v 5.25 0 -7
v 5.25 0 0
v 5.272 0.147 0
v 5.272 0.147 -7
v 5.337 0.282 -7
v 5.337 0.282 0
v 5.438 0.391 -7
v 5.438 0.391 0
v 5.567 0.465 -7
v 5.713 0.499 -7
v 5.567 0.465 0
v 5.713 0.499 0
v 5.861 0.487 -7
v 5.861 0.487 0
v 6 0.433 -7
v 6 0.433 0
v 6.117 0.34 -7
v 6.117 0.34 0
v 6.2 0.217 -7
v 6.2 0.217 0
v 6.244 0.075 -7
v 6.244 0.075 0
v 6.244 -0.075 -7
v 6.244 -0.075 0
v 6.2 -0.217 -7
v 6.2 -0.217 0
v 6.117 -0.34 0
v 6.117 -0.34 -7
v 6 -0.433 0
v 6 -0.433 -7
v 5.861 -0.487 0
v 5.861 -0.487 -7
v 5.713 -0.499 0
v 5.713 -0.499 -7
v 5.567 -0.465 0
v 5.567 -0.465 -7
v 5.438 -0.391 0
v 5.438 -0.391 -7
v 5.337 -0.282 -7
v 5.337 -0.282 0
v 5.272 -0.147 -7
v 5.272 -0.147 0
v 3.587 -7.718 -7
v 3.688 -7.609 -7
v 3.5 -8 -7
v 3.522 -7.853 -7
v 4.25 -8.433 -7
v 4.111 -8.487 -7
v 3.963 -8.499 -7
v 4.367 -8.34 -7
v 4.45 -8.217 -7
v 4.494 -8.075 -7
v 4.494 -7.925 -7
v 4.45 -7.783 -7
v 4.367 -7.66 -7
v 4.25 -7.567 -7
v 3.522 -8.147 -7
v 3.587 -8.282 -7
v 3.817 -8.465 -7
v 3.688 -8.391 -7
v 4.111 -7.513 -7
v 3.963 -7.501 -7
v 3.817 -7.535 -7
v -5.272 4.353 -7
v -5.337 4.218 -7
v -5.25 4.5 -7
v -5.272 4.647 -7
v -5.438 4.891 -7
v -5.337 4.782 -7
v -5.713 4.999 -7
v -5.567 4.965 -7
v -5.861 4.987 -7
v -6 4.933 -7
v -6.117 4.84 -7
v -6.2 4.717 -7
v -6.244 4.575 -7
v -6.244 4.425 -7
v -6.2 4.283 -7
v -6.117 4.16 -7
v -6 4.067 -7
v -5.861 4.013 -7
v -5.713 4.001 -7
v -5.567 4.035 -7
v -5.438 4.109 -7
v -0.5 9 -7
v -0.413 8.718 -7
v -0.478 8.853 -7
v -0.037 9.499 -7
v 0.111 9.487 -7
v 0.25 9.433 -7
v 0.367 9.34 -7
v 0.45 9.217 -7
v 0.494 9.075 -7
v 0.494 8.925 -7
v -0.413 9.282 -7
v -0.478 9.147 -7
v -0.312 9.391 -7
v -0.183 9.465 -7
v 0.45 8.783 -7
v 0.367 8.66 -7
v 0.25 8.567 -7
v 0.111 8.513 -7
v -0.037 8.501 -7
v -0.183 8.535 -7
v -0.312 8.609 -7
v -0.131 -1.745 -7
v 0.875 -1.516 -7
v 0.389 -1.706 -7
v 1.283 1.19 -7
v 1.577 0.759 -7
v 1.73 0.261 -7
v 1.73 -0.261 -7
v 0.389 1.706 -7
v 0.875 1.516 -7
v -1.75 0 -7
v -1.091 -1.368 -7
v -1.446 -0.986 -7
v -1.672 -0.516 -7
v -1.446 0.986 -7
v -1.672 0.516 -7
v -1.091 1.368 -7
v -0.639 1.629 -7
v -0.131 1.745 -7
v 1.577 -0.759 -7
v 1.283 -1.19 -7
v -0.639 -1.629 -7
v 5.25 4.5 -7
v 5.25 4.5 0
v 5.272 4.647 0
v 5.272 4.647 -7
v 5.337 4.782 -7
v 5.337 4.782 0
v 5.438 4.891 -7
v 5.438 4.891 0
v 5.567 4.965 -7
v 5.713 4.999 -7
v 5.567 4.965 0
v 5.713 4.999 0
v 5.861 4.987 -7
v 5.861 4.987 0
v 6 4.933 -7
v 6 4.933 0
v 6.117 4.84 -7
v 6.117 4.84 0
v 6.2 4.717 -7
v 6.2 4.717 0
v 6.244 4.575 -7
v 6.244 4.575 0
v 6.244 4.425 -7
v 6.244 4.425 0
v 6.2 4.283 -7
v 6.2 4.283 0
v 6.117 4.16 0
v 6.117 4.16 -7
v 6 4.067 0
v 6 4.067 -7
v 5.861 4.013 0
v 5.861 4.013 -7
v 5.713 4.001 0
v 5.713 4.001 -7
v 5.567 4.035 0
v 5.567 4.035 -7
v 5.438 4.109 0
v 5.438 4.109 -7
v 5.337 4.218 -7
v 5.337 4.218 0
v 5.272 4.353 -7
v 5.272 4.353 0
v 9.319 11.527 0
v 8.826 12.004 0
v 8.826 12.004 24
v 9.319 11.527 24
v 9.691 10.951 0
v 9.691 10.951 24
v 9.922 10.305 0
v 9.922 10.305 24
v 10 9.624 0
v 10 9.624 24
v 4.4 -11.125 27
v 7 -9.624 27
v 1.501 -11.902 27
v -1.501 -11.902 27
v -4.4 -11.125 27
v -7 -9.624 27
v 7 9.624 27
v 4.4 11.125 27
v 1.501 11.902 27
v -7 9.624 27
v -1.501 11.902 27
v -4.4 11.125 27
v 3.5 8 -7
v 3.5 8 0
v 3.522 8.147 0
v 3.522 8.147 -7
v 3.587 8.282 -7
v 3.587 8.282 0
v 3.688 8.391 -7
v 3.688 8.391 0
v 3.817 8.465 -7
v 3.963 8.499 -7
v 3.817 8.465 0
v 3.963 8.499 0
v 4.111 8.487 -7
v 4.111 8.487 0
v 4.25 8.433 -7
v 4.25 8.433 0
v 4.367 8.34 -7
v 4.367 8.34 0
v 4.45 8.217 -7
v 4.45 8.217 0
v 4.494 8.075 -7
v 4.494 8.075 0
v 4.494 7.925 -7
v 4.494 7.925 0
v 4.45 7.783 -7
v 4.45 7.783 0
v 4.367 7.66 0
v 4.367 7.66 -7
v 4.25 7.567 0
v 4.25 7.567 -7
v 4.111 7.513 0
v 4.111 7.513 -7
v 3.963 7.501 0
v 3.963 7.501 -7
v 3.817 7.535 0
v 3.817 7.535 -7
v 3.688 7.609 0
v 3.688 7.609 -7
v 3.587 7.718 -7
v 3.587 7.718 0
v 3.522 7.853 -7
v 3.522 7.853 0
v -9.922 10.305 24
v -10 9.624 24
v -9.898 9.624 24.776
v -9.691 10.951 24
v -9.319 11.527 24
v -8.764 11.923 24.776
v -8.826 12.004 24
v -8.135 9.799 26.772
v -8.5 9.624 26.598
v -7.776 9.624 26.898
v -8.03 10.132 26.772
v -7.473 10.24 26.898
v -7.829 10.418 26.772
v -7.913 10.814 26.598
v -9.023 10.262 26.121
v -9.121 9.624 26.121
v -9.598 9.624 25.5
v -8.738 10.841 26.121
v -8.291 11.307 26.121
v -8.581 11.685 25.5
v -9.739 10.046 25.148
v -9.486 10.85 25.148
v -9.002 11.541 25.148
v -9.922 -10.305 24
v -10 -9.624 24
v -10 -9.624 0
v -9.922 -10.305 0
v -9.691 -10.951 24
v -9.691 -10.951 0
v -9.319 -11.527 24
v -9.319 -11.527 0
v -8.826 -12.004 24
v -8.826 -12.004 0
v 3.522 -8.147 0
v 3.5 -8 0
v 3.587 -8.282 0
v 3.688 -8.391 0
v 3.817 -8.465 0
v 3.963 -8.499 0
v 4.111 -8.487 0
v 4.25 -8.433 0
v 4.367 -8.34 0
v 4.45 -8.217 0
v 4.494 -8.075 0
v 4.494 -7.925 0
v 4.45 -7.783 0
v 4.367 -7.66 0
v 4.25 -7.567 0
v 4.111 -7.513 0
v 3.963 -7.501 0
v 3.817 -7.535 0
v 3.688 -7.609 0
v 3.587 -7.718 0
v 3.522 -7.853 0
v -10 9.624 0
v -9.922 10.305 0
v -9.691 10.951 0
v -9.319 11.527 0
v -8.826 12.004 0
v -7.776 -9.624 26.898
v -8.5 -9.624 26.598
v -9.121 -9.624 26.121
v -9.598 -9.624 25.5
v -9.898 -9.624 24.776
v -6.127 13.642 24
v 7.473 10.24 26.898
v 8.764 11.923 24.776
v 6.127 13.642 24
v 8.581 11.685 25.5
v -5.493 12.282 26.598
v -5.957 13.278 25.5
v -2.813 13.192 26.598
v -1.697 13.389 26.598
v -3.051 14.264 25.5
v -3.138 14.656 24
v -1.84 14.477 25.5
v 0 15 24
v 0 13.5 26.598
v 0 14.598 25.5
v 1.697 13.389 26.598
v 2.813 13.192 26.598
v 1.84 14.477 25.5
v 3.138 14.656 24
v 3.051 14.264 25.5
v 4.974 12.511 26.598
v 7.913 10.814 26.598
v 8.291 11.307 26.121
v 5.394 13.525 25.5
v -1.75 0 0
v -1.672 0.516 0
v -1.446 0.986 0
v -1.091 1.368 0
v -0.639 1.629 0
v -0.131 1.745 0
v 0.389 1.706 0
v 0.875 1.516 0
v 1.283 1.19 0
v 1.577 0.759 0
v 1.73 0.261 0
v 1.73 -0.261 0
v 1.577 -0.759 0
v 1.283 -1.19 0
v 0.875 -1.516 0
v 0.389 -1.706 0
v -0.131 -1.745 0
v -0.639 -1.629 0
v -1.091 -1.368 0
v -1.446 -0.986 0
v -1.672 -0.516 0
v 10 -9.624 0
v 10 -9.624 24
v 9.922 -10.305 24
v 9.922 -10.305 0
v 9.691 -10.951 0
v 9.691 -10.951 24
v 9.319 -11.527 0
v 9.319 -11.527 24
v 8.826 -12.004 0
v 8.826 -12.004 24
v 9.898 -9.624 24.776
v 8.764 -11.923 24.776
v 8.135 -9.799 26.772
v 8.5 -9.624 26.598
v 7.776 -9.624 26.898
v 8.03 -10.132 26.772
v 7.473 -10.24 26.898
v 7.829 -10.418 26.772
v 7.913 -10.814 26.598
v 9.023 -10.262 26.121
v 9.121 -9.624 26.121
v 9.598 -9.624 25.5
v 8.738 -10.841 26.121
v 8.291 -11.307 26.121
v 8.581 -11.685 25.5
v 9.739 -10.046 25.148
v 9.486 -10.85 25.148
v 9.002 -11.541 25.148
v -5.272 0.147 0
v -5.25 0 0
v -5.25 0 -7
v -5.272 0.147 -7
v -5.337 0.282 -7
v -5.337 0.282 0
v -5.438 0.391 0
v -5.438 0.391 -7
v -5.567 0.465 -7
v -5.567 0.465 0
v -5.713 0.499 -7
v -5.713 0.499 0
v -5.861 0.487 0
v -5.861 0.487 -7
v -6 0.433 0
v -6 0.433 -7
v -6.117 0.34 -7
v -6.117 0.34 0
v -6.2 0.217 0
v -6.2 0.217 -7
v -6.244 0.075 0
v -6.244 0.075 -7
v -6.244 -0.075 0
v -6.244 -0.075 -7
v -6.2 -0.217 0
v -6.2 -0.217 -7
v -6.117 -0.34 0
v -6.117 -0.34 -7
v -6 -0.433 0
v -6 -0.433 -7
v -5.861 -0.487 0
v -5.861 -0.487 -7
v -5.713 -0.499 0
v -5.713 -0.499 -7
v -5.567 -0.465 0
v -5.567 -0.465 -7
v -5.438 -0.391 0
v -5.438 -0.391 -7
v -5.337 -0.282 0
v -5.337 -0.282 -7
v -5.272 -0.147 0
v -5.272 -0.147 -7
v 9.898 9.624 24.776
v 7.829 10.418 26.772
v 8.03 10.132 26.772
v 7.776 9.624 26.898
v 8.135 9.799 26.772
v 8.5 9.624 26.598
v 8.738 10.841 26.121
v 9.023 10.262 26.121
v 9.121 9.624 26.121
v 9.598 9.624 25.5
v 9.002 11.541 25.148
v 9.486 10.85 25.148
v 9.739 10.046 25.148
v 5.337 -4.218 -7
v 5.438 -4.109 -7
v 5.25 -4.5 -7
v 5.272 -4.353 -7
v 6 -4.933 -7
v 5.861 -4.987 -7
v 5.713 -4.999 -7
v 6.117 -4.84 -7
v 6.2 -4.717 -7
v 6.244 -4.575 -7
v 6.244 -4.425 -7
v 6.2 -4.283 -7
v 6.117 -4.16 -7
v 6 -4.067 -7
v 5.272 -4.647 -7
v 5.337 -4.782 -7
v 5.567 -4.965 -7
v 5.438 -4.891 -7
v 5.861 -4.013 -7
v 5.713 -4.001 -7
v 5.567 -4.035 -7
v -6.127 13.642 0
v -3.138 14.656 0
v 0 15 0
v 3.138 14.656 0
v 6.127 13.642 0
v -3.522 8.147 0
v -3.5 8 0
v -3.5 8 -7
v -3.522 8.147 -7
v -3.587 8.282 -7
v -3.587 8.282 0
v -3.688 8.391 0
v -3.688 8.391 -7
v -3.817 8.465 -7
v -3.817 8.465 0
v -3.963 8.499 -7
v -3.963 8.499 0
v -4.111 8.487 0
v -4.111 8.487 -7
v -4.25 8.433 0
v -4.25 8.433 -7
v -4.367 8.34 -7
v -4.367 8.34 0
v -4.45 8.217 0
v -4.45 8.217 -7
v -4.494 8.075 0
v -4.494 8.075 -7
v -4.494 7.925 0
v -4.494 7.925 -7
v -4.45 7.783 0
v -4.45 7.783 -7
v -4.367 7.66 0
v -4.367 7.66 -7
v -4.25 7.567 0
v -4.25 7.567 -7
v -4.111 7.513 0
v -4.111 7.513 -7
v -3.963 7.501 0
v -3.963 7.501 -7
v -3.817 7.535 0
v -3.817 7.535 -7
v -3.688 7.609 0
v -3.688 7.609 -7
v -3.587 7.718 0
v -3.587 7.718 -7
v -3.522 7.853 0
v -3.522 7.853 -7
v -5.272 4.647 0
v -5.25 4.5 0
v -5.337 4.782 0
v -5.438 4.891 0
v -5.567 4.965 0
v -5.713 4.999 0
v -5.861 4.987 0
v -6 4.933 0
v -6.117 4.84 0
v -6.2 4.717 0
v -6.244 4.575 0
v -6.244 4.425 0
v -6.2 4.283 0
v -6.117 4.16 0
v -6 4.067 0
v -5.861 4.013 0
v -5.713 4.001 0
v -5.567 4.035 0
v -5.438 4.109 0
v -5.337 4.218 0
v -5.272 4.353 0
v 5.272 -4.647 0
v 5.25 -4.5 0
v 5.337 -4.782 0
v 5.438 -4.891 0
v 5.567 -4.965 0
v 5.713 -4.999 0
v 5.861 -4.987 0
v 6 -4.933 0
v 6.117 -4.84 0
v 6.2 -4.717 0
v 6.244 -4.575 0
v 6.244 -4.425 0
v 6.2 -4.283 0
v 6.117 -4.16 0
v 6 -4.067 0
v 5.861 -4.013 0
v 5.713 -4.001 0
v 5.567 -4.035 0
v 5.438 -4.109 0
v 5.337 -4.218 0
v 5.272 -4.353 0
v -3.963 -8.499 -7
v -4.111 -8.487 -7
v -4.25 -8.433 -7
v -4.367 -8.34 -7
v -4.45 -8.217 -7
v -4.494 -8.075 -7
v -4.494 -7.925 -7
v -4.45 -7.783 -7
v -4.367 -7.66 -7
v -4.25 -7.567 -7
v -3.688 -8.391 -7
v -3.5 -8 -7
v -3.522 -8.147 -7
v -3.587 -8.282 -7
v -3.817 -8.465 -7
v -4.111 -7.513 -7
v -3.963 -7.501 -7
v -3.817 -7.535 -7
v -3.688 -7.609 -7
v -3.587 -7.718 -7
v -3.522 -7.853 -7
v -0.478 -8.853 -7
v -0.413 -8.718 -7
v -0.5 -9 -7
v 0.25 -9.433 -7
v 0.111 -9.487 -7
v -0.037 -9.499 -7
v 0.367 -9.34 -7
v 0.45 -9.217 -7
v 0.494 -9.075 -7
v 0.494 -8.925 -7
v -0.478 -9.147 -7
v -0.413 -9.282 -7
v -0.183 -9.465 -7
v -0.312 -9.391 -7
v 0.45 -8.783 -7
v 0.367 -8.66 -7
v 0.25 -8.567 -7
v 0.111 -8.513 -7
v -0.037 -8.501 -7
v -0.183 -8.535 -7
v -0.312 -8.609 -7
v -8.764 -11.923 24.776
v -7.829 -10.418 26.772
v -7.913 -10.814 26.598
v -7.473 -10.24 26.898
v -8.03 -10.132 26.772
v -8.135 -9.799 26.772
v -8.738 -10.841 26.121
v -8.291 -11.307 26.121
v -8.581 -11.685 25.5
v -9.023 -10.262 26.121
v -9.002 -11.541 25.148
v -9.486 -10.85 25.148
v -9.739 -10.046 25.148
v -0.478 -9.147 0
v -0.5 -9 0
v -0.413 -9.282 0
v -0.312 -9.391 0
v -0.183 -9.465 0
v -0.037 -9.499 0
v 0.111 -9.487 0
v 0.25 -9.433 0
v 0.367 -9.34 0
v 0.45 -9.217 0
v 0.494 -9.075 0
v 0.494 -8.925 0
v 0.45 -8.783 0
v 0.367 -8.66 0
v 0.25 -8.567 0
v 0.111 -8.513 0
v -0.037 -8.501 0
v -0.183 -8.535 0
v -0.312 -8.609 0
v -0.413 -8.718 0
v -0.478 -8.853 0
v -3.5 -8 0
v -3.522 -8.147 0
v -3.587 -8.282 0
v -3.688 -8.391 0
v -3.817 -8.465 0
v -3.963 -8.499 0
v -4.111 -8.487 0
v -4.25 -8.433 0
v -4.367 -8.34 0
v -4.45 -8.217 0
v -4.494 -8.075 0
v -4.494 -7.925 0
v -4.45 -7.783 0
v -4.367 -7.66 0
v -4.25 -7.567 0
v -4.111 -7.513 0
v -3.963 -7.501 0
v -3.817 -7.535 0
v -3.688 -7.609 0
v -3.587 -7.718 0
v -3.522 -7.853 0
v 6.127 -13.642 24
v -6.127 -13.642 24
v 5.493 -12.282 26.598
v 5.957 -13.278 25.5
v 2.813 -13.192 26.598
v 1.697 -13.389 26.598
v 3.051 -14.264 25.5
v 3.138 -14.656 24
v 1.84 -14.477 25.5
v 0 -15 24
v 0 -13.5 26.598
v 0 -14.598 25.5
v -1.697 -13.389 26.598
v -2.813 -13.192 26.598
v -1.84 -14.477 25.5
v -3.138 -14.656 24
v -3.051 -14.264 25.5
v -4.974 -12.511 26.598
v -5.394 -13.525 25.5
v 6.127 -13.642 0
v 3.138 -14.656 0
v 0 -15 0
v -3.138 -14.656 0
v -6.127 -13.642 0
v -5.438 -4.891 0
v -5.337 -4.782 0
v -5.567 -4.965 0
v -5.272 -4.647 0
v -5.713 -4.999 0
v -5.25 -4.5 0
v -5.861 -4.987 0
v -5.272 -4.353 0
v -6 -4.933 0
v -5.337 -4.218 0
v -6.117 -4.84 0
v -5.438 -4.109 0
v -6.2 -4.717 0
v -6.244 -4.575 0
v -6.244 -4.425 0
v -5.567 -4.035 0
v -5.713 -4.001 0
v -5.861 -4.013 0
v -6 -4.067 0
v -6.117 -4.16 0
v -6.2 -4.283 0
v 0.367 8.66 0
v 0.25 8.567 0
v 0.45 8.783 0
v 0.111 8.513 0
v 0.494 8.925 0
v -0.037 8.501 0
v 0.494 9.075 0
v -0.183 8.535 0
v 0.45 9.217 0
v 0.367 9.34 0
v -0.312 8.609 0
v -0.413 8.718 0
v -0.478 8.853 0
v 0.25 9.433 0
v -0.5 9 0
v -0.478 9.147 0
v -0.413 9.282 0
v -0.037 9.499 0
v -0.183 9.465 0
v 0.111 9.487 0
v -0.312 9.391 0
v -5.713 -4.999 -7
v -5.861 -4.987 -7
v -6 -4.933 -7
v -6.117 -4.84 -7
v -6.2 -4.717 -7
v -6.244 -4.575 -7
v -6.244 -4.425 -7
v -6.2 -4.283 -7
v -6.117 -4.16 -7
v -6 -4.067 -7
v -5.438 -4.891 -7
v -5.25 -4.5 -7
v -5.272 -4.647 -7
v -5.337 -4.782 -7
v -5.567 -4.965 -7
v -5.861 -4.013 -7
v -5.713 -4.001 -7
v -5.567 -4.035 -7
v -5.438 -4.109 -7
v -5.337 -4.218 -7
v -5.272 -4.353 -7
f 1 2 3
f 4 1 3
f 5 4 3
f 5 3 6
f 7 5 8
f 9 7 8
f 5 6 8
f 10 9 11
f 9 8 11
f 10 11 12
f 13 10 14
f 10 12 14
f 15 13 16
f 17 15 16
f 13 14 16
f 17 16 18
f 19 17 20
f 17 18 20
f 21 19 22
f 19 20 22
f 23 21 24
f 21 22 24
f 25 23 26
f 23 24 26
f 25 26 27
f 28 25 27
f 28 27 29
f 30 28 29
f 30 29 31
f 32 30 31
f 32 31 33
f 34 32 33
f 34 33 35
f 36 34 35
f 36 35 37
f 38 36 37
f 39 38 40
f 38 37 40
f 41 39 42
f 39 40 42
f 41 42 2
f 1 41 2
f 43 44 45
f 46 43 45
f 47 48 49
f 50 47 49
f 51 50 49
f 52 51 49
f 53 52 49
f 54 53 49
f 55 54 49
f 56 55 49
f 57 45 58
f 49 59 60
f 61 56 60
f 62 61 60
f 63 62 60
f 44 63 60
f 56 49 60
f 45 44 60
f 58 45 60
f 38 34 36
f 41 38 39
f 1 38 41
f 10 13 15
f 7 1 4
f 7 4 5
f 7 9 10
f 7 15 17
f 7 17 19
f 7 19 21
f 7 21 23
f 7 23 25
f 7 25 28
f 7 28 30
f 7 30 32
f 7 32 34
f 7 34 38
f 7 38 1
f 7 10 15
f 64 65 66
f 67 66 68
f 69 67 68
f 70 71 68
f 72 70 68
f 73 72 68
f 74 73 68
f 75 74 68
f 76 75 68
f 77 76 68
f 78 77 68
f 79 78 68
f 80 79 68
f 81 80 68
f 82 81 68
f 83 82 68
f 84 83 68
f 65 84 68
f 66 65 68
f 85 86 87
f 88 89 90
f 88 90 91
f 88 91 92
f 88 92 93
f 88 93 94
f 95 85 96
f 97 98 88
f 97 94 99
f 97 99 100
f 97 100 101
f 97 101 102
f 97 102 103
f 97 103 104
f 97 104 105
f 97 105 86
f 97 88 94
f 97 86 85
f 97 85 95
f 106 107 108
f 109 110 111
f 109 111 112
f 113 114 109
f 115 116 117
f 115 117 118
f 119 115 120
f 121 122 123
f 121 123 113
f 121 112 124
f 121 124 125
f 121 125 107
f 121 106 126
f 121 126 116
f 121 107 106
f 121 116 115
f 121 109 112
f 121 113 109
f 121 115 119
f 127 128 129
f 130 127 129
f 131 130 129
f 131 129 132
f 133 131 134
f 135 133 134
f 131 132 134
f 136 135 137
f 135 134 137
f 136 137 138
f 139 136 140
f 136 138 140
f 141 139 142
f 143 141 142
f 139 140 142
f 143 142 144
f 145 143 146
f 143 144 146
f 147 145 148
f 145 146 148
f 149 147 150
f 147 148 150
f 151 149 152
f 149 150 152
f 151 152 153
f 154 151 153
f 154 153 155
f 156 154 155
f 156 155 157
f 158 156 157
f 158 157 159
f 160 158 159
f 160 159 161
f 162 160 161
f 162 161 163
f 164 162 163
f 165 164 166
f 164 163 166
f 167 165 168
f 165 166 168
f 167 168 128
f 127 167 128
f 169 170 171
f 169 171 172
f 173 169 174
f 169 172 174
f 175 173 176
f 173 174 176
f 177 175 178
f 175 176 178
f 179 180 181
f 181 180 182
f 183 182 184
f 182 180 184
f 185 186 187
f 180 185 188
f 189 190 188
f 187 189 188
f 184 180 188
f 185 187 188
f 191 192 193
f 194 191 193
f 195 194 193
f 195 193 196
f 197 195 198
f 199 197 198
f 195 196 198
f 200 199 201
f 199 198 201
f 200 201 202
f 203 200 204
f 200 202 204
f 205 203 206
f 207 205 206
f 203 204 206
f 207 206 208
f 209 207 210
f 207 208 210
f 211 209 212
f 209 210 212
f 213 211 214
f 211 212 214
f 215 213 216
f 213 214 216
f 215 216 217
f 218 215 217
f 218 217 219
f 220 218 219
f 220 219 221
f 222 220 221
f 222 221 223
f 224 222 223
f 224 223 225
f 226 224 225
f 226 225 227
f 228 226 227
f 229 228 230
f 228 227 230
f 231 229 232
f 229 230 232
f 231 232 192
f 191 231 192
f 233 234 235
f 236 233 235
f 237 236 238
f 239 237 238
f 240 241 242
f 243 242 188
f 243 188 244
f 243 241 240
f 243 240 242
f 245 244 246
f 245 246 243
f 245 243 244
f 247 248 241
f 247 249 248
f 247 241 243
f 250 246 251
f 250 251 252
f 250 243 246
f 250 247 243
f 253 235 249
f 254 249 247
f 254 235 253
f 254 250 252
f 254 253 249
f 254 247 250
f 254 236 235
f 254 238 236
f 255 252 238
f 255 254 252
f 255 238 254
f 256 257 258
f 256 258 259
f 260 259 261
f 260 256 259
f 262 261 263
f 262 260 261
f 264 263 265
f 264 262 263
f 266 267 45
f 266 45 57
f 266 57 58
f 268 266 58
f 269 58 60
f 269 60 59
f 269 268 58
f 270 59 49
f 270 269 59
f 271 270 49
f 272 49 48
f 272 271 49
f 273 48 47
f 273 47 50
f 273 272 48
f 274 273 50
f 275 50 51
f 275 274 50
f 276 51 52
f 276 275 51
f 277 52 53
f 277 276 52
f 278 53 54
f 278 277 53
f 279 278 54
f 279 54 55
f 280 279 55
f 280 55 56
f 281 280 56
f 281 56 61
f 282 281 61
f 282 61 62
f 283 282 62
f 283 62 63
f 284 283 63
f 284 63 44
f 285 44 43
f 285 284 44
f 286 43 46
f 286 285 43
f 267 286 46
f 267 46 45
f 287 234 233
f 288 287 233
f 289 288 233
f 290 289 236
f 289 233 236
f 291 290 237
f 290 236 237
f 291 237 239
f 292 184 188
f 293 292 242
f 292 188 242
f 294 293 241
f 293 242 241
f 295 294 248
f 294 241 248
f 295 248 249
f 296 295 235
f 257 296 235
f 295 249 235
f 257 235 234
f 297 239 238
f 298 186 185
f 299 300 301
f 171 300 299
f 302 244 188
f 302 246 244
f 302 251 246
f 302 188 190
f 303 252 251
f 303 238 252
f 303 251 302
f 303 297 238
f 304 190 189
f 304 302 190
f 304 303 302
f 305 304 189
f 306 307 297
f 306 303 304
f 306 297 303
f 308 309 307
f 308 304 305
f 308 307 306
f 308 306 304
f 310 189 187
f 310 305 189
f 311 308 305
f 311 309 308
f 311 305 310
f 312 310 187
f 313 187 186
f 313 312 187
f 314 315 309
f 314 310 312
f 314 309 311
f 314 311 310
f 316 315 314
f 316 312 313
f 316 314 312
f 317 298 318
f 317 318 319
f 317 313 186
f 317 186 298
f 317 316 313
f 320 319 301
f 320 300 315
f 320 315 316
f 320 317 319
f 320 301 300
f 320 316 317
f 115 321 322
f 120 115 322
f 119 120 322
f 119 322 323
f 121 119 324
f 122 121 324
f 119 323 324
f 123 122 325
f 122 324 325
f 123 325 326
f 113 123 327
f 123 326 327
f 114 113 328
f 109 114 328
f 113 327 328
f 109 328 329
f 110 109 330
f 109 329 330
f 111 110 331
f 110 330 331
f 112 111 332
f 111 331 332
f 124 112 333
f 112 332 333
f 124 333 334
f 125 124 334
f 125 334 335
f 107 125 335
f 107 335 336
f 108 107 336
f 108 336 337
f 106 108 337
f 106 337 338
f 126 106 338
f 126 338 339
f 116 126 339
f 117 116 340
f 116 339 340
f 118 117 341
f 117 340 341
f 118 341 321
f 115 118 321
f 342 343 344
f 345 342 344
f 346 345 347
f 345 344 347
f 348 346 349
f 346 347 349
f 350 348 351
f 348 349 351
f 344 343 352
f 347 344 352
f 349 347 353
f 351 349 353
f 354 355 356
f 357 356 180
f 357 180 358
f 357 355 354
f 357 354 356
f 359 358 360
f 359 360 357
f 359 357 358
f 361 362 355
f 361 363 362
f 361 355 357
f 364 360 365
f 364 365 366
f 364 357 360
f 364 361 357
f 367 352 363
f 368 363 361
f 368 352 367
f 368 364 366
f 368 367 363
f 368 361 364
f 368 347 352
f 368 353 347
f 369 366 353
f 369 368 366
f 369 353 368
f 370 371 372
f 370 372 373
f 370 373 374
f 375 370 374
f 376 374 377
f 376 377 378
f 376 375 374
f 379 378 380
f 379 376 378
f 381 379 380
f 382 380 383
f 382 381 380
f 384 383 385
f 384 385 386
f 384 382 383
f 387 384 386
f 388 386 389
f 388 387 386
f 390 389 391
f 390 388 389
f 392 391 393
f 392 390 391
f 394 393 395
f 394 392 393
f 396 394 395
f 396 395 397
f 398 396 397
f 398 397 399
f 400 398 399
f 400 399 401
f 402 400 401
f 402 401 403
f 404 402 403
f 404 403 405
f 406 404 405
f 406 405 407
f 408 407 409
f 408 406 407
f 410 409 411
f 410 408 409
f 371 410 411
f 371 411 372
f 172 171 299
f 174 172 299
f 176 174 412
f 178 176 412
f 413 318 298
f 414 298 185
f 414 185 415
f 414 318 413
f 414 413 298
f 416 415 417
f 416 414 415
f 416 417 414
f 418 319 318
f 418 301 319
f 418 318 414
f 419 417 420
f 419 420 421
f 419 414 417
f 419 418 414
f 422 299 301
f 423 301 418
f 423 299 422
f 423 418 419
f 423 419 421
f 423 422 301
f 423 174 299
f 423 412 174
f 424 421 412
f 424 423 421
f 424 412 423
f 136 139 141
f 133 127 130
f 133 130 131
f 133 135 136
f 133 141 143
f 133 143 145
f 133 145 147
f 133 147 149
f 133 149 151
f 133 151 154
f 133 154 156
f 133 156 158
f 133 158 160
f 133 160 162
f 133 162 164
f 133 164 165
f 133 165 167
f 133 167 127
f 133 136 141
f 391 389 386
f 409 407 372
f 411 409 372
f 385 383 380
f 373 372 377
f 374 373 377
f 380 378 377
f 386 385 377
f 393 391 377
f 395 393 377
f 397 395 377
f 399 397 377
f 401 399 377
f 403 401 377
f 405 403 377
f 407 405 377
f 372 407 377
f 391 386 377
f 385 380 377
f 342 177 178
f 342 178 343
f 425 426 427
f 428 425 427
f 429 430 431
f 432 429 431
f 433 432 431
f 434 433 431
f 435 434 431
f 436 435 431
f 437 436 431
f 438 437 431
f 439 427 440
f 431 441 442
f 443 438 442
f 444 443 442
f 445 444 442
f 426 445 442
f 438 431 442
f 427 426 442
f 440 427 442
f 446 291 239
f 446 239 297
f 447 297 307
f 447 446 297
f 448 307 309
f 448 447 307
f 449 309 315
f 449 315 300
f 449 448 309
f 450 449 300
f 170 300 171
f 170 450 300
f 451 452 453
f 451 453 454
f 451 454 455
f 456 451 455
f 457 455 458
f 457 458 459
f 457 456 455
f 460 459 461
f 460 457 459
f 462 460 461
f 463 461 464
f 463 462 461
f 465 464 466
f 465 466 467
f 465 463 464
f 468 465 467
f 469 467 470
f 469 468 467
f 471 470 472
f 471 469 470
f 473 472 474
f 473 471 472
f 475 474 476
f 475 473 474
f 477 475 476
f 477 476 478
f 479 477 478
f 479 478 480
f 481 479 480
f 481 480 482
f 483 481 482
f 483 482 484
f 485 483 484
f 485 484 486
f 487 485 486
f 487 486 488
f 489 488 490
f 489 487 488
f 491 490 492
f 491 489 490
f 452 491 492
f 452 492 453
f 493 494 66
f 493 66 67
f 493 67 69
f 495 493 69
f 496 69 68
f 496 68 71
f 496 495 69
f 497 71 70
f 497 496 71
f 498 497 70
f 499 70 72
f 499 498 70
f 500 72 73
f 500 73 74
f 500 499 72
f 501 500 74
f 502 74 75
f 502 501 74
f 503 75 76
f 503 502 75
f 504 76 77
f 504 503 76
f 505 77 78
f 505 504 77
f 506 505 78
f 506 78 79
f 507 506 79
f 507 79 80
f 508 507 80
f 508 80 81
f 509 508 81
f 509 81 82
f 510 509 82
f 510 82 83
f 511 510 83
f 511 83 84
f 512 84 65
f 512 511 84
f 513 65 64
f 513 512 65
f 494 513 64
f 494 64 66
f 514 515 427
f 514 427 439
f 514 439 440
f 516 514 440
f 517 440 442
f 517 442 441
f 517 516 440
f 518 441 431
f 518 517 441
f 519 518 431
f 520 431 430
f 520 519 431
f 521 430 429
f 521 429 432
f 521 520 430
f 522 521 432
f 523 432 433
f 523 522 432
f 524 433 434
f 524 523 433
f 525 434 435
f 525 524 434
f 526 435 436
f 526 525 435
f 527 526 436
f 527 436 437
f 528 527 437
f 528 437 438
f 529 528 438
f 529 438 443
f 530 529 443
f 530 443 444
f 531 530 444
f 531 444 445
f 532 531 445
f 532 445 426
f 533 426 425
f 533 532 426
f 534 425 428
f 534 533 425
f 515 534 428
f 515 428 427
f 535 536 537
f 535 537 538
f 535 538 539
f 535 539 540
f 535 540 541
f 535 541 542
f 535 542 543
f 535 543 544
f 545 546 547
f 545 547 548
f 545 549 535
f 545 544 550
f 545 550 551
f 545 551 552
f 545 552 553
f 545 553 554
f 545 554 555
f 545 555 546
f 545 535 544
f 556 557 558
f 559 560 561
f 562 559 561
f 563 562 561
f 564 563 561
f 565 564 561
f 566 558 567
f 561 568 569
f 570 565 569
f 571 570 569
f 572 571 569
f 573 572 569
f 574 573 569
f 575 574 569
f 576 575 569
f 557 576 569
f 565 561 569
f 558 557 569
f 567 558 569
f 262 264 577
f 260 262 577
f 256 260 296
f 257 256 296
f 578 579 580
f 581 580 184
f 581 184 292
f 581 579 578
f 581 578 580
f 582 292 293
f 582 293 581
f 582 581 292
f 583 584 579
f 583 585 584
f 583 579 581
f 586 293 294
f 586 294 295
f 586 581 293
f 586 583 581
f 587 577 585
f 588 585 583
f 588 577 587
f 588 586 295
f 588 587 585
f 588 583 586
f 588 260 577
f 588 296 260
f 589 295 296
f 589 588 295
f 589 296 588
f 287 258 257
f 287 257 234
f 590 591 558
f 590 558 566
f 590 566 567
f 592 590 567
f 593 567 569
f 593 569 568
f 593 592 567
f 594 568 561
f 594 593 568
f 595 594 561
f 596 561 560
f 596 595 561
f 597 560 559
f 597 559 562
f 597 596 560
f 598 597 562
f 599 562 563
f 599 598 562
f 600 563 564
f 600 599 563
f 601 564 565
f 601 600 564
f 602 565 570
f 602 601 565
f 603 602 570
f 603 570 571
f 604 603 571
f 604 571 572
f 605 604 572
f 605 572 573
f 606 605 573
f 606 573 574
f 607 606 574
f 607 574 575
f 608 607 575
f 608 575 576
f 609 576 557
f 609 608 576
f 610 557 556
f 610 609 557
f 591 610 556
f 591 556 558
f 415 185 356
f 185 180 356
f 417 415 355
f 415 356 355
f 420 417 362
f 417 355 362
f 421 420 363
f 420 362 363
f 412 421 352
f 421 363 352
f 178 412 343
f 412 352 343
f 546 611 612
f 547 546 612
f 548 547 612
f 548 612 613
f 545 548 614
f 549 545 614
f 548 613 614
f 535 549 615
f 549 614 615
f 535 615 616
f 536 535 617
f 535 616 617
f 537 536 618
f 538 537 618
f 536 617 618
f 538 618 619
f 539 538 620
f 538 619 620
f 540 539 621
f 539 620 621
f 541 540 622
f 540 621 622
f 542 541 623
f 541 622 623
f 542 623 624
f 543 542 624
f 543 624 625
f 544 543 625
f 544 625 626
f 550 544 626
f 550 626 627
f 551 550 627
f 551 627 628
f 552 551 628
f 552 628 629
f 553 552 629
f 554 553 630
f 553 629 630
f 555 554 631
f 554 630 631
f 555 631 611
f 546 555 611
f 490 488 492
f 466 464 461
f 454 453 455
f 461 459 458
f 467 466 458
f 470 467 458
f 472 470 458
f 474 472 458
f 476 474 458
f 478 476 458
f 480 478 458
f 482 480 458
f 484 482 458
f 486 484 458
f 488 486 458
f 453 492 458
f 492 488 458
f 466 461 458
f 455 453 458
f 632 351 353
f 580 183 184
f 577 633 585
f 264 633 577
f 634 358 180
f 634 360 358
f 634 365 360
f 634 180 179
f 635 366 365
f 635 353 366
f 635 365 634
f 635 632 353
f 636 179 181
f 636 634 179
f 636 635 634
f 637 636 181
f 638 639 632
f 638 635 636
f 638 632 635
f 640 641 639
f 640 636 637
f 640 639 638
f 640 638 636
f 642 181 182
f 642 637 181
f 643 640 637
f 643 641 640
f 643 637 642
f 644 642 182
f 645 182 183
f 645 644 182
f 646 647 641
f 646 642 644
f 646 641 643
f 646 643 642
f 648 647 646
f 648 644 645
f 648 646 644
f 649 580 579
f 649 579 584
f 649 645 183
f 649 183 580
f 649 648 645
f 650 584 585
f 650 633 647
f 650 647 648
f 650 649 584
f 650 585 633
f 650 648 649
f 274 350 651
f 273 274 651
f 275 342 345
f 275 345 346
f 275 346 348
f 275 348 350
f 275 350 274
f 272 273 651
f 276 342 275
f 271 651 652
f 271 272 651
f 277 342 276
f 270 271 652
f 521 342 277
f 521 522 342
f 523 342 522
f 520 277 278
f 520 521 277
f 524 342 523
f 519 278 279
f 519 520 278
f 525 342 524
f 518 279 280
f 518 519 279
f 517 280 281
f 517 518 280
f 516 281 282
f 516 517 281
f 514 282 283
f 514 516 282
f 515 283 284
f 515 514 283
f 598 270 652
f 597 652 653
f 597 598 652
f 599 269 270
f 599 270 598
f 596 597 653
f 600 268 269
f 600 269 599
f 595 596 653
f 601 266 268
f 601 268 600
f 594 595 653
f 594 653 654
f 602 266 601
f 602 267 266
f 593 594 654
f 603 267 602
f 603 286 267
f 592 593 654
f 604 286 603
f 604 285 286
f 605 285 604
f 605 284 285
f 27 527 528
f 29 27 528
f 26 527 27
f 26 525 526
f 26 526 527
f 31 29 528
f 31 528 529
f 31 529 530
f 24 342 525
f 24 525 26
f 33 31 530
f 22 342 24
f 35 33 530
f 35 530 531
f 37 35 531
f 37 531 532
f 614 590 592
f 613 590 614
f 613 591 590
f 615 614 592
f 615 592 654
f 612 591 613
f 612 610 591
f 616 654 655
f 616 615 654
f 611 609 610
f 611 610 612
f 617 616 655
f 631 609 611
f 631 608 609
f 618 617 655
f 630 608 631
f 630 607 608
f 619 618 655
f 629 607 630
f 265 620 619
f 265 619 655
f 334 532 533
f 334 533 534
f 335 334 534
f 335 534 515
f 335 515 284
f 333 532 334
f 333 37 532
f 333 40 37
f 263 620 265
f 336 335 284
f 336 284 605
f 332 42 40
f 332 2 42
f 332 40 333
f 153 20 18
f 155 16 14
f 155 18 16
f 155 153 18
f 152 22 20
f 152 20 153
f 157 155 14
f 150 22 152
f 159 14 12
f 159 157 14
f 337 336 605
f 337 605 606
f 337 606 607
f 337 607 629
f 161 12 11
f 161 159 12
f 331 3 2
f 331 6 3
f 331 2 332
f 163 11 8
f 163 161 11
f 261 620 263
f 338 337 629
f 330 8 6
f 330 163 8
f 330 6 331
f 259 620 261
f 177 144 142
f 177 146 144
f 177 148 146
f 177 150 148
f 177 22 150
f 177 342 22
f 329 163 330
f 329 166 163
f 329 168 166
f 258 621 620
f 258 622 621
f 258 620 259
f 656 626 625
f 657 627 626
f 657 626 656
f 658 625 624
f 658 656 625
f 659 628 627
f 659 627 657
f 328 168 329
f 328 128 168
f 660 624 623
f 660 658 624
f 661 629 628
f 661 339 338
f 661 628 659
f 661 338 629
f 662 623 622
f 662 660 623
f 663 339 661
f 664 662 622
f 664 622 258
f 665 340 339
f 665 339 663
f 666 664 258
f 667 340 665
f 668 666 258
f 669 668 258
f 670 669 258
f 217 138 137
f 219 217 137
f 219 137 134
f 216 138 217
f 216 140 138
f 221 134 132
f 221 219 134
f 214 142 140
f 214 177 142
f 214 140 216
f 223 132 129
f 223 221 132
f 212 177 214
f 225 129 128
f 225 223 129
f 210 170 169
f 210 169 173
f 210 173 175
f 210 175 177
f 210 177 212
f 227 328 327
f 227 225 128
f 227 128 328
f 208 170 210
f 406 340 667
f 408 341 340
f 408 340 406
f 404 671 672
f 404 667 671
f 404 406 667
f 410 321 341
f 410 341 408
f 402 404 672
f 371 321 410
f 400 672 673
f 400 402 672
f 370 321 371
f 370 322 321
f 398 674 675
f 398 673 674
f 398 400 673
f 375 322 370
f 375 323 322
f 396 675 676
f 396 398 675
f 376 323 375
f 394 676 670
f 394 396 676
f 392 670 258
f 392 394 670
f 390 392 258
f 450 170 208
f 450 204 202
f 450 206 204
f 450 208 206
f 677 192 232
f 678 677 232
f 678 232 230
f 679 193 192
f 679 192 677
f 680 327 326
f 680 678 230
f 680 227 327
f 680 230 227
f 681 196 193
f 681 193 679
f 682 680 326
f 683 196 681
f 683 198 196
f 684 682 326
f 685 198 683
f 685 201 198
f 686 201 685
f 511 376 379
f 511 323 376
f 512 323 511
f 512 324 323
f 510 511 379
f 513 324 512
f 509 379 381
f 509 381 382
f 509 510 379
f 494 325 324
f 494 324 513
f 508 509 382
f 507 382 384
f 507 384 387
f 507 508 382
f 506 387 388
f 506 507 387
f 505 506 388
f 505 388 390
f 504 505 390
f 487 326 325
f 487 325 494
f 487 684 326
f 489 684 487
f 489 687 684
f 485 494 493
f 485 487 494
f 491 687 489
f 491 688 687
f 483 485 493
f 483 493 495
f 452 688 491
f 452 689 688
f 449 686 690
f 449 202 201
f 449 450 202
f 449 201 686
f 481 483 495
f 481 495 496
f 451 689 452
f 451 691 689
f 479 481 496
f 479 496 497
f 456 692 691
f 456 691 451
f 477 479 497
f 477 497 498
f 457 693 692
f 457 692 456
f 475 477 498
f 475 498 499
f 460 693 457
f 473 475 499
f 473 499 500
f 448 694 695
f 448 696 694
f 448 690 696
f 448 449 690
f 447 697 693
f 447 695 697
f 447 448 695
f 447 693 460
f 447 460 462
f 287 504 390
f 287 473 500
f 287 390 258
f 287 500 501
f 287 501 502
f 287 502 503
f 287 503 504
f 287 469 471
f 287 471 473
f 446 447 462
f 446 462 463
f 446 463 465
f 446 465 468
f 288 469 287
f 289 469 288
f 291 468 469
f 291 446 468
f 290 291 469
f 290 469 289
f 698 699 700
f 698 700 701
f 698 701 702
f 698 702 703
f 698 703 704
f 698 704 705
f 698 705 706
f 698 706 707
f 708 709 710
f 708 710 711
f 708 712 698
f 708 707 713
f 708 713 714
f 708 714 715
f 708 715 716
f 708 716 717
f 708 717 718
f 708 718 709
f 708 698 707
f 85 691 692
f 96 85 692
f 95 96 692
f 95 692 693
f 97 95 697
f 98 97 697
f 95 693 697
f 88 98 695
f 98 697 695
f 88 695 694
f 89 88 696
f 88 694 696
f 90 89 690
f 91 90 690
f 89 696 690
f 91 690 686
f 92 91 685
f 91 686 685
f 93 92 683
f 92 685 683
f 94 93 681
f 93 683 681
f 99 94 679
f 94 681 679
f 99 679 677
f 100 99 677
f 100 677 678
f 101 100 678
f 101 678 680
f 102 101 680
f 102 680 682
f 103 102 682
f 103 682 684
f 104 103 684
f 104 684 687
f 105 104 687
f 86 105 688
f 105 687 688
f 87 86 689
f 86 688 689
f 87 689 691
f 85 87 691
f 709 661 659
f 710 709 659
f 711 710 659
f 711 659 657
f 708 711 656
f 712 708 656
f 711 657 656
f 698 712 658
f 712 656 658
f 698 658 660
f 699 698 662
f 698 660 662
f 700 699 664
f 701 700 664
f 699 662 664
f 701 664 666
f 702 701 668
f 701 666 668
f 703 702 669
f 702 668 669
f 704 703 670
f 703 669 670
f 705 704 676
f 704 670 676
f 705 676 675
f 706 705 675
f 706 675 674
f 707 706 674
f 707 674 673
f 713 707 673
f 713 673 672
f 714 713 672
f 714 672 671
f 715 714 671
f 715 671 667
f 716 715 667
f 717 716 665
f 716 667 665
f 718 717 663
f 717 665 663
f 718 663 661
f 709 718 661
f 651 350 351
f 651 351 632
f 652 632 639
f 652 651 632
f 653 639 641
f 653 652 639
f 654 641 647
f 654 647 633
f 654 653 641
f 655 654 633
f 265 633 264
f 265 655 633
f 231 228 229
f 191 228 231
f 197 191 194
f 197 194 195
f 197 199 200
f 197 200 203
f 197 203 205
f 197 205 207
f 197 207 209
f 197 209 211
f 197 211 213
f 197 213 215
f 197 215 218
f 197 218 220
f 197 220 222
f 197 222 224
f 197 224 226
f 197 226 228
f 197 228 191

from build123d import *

# Parameters (mm, degrees)
BOSS_EXTRUDE1_DEPTH   = 27
FILLET1_R             = 3
FILLET2_R             = 3
SKETCH3_R             = 1.75
BOSS_EXTRUDE2_DEPTH   = 7
SKETCH4_R             = 0.5
BOSS_EXTRUDE3_DEPTH   = 7
BOSS_EXTRUDE3_2_DEPTH = 7
BOSS_EXTRUDE3_3_DEPTH = 7
BOSS_EXTRUDE3_4_DEPTH = 7


with BuildPart() as part:
    # Sketch1 → Boss-Extrude1 (new body)
    with BuildSketch(Plane.XY):
        with BuildLine():
            Line((-10, -11), (-10, 11))
            ThreePointArc((-10, 11), (0, 15), (10, 11))
            Line((10, 11), (10, -11))
            ThreePointArc((10, -11), (0, -15), (-10, -11))
        make_face()
    extrude(amount=BOSS_EXTRUDE1_DEPTH)

    # Fillet1
    fillet1_edges = [part.edges().sort_by_distance(p)[0] for p in [
        (10, 11, 13.5),
        (10, -11, 13.5),
        (-10, -11, 13.5),
        (-10, 11, 13.5),
    ]]
    fillet(fillet1_edges, radius=FILLET1_R)

    # Fillet2
    fillet2_edges = [part.edges().sort_by_distance(p)[0] for p in [
        (10, 0, 27),
        (0, -15, 27),
        (0, 15, 27),
        (-10, 0, 27),
        (9.690563219, 10.951121401, 27),
        (-9.690563219, 10.951121401, 27),
        (-9.690563219, -10.951121401, 27),
        (9.690563219, -10.951121401, 27),
    ]]
    fillet(fillet2_edges, radius=FILLET2_R)

    # Sketch3 → Boss-Extrude2 (add)
    with BuildSketch(Plane(origin=(0, 0, 0), x_dir=(-1, 0, 0), z_dir=(0, 0, -1))):
        Circle(SKETCH3_R)
    extrude(amount=BOSS_EXTRUDE2_DEPTH)


with BuildPart() as body_2:
    # Sketch4 → Boss-Extrude3 (new body)
    with BuildSketch(Plane(origin=(0, 0, 0), x_dir=(-1, 0, 0), z_dir=(0, 0, -1))):
        with Locations((-5.75, 0)):
            Circle(SKETCH4_R)
    extrude(amount=BOSS_EXTRUDE3_DEPTH)


with BuildPart() as body_3:
    # Sketch4 → Boss-Extrude3 2 (new body)
    with BuildSketch(Plane(origin=(0, 0, 0), x_dir=(-1, 0, 0), z_dir=(0, 0, -1))):
        with Locations((-5.75, 4.5)):
            Circle(SKETCH4_R)
    extrude(amount=BOSS_EXTRUDE3_2_DEPTH)


with BuildPart() as body_4:
    # Sketch4 → Boss-Extrude3 3 (new body)
    with BuildSketch(Plane(origin=(0, 0, 0), x_dir=(-1, 0, 0), z_dir=(0, 0, -1))):
        with Locations((-4, 8)):
            Circle(SKETCH4_R)
    extrude(amount=BOSS_EXTRUDE3_3_DEPTH)


with BuildPart() as body_5:
    # Sketch4 → Boss-Extrude3 4 (new body)
    with BuildSketch(Plane(origin=(0, 0, 0), x_dir=(-1, 0, 0), z_dir=(0, 0, -1))):
        with Locations((0, 9)):
            Circle(SKETCH4_R)
    extrude(amount=BOSS_EXTRUDE3_4_DEPTH)


with BuildPart() as body_6:
    # Mirror1: mirrored copy
    add(body_4.part.mirror(Plane(origin=(0, 0, 0), x_dir=(0, 0, 1), z_dir=(1, 0, 0))))


with BuildPart() as body_7:
    # Mirror1 2: mirrored copy
    add(body_3.part.mirror(Plane(origin=(0, 0, 0), x_dir=(0, 0, 1), z_dir=(1, 0, 0))))


with BuildPart() as body_8:
    # Mirror1 3: mirrored copy
    add(body_2.part.mirror(Plane(origin=(0, 0, 0), x_dir=(0, 0, 1), z_dir=(1, 0, 0))))


with BuildPart() as body_9:
    # Mirror2: mirrored copy
    add(body_3.part.mirror(Plane.ZX))


with BuildPart() as body_10:
    # Mirror2 2: mirrored copy
    add(body_4.part.mirror(Plane.ZX))


with BuildPart() as body_11:
    # Mirror2 3: mirrored copy
    add(body_5.part.mirror(Plane.ZX))


with BuildPart() as body_12:
    # Mirror2 4: mirrored copy
    add(body_6.part.mirror(Plane.ZX))


with BuildPart() as body_13:
    # Mirror2 5: mirrored copy
    add(body_7.part.mirror(Plane.ZX))


with BuildPart() as body_2_1:
    add(body_2.part)

    # Combine1: union body 5, body 7, body 9, body 13, body 3, body 6, body 12, body 4, body 11, body 8, body 10, part
    add(body_5.part)
    add(body_7.part)
    add(body_9.part)
    add(body_13.part)
    add(body_3.part)
    add(body_6.part)
    add(body_12.part)
    add(body_4.part)
    add(body_11.part)
    add(body_8.part)
    add(body_10.part)
    add(part.part)


solid = body_2_1.part
